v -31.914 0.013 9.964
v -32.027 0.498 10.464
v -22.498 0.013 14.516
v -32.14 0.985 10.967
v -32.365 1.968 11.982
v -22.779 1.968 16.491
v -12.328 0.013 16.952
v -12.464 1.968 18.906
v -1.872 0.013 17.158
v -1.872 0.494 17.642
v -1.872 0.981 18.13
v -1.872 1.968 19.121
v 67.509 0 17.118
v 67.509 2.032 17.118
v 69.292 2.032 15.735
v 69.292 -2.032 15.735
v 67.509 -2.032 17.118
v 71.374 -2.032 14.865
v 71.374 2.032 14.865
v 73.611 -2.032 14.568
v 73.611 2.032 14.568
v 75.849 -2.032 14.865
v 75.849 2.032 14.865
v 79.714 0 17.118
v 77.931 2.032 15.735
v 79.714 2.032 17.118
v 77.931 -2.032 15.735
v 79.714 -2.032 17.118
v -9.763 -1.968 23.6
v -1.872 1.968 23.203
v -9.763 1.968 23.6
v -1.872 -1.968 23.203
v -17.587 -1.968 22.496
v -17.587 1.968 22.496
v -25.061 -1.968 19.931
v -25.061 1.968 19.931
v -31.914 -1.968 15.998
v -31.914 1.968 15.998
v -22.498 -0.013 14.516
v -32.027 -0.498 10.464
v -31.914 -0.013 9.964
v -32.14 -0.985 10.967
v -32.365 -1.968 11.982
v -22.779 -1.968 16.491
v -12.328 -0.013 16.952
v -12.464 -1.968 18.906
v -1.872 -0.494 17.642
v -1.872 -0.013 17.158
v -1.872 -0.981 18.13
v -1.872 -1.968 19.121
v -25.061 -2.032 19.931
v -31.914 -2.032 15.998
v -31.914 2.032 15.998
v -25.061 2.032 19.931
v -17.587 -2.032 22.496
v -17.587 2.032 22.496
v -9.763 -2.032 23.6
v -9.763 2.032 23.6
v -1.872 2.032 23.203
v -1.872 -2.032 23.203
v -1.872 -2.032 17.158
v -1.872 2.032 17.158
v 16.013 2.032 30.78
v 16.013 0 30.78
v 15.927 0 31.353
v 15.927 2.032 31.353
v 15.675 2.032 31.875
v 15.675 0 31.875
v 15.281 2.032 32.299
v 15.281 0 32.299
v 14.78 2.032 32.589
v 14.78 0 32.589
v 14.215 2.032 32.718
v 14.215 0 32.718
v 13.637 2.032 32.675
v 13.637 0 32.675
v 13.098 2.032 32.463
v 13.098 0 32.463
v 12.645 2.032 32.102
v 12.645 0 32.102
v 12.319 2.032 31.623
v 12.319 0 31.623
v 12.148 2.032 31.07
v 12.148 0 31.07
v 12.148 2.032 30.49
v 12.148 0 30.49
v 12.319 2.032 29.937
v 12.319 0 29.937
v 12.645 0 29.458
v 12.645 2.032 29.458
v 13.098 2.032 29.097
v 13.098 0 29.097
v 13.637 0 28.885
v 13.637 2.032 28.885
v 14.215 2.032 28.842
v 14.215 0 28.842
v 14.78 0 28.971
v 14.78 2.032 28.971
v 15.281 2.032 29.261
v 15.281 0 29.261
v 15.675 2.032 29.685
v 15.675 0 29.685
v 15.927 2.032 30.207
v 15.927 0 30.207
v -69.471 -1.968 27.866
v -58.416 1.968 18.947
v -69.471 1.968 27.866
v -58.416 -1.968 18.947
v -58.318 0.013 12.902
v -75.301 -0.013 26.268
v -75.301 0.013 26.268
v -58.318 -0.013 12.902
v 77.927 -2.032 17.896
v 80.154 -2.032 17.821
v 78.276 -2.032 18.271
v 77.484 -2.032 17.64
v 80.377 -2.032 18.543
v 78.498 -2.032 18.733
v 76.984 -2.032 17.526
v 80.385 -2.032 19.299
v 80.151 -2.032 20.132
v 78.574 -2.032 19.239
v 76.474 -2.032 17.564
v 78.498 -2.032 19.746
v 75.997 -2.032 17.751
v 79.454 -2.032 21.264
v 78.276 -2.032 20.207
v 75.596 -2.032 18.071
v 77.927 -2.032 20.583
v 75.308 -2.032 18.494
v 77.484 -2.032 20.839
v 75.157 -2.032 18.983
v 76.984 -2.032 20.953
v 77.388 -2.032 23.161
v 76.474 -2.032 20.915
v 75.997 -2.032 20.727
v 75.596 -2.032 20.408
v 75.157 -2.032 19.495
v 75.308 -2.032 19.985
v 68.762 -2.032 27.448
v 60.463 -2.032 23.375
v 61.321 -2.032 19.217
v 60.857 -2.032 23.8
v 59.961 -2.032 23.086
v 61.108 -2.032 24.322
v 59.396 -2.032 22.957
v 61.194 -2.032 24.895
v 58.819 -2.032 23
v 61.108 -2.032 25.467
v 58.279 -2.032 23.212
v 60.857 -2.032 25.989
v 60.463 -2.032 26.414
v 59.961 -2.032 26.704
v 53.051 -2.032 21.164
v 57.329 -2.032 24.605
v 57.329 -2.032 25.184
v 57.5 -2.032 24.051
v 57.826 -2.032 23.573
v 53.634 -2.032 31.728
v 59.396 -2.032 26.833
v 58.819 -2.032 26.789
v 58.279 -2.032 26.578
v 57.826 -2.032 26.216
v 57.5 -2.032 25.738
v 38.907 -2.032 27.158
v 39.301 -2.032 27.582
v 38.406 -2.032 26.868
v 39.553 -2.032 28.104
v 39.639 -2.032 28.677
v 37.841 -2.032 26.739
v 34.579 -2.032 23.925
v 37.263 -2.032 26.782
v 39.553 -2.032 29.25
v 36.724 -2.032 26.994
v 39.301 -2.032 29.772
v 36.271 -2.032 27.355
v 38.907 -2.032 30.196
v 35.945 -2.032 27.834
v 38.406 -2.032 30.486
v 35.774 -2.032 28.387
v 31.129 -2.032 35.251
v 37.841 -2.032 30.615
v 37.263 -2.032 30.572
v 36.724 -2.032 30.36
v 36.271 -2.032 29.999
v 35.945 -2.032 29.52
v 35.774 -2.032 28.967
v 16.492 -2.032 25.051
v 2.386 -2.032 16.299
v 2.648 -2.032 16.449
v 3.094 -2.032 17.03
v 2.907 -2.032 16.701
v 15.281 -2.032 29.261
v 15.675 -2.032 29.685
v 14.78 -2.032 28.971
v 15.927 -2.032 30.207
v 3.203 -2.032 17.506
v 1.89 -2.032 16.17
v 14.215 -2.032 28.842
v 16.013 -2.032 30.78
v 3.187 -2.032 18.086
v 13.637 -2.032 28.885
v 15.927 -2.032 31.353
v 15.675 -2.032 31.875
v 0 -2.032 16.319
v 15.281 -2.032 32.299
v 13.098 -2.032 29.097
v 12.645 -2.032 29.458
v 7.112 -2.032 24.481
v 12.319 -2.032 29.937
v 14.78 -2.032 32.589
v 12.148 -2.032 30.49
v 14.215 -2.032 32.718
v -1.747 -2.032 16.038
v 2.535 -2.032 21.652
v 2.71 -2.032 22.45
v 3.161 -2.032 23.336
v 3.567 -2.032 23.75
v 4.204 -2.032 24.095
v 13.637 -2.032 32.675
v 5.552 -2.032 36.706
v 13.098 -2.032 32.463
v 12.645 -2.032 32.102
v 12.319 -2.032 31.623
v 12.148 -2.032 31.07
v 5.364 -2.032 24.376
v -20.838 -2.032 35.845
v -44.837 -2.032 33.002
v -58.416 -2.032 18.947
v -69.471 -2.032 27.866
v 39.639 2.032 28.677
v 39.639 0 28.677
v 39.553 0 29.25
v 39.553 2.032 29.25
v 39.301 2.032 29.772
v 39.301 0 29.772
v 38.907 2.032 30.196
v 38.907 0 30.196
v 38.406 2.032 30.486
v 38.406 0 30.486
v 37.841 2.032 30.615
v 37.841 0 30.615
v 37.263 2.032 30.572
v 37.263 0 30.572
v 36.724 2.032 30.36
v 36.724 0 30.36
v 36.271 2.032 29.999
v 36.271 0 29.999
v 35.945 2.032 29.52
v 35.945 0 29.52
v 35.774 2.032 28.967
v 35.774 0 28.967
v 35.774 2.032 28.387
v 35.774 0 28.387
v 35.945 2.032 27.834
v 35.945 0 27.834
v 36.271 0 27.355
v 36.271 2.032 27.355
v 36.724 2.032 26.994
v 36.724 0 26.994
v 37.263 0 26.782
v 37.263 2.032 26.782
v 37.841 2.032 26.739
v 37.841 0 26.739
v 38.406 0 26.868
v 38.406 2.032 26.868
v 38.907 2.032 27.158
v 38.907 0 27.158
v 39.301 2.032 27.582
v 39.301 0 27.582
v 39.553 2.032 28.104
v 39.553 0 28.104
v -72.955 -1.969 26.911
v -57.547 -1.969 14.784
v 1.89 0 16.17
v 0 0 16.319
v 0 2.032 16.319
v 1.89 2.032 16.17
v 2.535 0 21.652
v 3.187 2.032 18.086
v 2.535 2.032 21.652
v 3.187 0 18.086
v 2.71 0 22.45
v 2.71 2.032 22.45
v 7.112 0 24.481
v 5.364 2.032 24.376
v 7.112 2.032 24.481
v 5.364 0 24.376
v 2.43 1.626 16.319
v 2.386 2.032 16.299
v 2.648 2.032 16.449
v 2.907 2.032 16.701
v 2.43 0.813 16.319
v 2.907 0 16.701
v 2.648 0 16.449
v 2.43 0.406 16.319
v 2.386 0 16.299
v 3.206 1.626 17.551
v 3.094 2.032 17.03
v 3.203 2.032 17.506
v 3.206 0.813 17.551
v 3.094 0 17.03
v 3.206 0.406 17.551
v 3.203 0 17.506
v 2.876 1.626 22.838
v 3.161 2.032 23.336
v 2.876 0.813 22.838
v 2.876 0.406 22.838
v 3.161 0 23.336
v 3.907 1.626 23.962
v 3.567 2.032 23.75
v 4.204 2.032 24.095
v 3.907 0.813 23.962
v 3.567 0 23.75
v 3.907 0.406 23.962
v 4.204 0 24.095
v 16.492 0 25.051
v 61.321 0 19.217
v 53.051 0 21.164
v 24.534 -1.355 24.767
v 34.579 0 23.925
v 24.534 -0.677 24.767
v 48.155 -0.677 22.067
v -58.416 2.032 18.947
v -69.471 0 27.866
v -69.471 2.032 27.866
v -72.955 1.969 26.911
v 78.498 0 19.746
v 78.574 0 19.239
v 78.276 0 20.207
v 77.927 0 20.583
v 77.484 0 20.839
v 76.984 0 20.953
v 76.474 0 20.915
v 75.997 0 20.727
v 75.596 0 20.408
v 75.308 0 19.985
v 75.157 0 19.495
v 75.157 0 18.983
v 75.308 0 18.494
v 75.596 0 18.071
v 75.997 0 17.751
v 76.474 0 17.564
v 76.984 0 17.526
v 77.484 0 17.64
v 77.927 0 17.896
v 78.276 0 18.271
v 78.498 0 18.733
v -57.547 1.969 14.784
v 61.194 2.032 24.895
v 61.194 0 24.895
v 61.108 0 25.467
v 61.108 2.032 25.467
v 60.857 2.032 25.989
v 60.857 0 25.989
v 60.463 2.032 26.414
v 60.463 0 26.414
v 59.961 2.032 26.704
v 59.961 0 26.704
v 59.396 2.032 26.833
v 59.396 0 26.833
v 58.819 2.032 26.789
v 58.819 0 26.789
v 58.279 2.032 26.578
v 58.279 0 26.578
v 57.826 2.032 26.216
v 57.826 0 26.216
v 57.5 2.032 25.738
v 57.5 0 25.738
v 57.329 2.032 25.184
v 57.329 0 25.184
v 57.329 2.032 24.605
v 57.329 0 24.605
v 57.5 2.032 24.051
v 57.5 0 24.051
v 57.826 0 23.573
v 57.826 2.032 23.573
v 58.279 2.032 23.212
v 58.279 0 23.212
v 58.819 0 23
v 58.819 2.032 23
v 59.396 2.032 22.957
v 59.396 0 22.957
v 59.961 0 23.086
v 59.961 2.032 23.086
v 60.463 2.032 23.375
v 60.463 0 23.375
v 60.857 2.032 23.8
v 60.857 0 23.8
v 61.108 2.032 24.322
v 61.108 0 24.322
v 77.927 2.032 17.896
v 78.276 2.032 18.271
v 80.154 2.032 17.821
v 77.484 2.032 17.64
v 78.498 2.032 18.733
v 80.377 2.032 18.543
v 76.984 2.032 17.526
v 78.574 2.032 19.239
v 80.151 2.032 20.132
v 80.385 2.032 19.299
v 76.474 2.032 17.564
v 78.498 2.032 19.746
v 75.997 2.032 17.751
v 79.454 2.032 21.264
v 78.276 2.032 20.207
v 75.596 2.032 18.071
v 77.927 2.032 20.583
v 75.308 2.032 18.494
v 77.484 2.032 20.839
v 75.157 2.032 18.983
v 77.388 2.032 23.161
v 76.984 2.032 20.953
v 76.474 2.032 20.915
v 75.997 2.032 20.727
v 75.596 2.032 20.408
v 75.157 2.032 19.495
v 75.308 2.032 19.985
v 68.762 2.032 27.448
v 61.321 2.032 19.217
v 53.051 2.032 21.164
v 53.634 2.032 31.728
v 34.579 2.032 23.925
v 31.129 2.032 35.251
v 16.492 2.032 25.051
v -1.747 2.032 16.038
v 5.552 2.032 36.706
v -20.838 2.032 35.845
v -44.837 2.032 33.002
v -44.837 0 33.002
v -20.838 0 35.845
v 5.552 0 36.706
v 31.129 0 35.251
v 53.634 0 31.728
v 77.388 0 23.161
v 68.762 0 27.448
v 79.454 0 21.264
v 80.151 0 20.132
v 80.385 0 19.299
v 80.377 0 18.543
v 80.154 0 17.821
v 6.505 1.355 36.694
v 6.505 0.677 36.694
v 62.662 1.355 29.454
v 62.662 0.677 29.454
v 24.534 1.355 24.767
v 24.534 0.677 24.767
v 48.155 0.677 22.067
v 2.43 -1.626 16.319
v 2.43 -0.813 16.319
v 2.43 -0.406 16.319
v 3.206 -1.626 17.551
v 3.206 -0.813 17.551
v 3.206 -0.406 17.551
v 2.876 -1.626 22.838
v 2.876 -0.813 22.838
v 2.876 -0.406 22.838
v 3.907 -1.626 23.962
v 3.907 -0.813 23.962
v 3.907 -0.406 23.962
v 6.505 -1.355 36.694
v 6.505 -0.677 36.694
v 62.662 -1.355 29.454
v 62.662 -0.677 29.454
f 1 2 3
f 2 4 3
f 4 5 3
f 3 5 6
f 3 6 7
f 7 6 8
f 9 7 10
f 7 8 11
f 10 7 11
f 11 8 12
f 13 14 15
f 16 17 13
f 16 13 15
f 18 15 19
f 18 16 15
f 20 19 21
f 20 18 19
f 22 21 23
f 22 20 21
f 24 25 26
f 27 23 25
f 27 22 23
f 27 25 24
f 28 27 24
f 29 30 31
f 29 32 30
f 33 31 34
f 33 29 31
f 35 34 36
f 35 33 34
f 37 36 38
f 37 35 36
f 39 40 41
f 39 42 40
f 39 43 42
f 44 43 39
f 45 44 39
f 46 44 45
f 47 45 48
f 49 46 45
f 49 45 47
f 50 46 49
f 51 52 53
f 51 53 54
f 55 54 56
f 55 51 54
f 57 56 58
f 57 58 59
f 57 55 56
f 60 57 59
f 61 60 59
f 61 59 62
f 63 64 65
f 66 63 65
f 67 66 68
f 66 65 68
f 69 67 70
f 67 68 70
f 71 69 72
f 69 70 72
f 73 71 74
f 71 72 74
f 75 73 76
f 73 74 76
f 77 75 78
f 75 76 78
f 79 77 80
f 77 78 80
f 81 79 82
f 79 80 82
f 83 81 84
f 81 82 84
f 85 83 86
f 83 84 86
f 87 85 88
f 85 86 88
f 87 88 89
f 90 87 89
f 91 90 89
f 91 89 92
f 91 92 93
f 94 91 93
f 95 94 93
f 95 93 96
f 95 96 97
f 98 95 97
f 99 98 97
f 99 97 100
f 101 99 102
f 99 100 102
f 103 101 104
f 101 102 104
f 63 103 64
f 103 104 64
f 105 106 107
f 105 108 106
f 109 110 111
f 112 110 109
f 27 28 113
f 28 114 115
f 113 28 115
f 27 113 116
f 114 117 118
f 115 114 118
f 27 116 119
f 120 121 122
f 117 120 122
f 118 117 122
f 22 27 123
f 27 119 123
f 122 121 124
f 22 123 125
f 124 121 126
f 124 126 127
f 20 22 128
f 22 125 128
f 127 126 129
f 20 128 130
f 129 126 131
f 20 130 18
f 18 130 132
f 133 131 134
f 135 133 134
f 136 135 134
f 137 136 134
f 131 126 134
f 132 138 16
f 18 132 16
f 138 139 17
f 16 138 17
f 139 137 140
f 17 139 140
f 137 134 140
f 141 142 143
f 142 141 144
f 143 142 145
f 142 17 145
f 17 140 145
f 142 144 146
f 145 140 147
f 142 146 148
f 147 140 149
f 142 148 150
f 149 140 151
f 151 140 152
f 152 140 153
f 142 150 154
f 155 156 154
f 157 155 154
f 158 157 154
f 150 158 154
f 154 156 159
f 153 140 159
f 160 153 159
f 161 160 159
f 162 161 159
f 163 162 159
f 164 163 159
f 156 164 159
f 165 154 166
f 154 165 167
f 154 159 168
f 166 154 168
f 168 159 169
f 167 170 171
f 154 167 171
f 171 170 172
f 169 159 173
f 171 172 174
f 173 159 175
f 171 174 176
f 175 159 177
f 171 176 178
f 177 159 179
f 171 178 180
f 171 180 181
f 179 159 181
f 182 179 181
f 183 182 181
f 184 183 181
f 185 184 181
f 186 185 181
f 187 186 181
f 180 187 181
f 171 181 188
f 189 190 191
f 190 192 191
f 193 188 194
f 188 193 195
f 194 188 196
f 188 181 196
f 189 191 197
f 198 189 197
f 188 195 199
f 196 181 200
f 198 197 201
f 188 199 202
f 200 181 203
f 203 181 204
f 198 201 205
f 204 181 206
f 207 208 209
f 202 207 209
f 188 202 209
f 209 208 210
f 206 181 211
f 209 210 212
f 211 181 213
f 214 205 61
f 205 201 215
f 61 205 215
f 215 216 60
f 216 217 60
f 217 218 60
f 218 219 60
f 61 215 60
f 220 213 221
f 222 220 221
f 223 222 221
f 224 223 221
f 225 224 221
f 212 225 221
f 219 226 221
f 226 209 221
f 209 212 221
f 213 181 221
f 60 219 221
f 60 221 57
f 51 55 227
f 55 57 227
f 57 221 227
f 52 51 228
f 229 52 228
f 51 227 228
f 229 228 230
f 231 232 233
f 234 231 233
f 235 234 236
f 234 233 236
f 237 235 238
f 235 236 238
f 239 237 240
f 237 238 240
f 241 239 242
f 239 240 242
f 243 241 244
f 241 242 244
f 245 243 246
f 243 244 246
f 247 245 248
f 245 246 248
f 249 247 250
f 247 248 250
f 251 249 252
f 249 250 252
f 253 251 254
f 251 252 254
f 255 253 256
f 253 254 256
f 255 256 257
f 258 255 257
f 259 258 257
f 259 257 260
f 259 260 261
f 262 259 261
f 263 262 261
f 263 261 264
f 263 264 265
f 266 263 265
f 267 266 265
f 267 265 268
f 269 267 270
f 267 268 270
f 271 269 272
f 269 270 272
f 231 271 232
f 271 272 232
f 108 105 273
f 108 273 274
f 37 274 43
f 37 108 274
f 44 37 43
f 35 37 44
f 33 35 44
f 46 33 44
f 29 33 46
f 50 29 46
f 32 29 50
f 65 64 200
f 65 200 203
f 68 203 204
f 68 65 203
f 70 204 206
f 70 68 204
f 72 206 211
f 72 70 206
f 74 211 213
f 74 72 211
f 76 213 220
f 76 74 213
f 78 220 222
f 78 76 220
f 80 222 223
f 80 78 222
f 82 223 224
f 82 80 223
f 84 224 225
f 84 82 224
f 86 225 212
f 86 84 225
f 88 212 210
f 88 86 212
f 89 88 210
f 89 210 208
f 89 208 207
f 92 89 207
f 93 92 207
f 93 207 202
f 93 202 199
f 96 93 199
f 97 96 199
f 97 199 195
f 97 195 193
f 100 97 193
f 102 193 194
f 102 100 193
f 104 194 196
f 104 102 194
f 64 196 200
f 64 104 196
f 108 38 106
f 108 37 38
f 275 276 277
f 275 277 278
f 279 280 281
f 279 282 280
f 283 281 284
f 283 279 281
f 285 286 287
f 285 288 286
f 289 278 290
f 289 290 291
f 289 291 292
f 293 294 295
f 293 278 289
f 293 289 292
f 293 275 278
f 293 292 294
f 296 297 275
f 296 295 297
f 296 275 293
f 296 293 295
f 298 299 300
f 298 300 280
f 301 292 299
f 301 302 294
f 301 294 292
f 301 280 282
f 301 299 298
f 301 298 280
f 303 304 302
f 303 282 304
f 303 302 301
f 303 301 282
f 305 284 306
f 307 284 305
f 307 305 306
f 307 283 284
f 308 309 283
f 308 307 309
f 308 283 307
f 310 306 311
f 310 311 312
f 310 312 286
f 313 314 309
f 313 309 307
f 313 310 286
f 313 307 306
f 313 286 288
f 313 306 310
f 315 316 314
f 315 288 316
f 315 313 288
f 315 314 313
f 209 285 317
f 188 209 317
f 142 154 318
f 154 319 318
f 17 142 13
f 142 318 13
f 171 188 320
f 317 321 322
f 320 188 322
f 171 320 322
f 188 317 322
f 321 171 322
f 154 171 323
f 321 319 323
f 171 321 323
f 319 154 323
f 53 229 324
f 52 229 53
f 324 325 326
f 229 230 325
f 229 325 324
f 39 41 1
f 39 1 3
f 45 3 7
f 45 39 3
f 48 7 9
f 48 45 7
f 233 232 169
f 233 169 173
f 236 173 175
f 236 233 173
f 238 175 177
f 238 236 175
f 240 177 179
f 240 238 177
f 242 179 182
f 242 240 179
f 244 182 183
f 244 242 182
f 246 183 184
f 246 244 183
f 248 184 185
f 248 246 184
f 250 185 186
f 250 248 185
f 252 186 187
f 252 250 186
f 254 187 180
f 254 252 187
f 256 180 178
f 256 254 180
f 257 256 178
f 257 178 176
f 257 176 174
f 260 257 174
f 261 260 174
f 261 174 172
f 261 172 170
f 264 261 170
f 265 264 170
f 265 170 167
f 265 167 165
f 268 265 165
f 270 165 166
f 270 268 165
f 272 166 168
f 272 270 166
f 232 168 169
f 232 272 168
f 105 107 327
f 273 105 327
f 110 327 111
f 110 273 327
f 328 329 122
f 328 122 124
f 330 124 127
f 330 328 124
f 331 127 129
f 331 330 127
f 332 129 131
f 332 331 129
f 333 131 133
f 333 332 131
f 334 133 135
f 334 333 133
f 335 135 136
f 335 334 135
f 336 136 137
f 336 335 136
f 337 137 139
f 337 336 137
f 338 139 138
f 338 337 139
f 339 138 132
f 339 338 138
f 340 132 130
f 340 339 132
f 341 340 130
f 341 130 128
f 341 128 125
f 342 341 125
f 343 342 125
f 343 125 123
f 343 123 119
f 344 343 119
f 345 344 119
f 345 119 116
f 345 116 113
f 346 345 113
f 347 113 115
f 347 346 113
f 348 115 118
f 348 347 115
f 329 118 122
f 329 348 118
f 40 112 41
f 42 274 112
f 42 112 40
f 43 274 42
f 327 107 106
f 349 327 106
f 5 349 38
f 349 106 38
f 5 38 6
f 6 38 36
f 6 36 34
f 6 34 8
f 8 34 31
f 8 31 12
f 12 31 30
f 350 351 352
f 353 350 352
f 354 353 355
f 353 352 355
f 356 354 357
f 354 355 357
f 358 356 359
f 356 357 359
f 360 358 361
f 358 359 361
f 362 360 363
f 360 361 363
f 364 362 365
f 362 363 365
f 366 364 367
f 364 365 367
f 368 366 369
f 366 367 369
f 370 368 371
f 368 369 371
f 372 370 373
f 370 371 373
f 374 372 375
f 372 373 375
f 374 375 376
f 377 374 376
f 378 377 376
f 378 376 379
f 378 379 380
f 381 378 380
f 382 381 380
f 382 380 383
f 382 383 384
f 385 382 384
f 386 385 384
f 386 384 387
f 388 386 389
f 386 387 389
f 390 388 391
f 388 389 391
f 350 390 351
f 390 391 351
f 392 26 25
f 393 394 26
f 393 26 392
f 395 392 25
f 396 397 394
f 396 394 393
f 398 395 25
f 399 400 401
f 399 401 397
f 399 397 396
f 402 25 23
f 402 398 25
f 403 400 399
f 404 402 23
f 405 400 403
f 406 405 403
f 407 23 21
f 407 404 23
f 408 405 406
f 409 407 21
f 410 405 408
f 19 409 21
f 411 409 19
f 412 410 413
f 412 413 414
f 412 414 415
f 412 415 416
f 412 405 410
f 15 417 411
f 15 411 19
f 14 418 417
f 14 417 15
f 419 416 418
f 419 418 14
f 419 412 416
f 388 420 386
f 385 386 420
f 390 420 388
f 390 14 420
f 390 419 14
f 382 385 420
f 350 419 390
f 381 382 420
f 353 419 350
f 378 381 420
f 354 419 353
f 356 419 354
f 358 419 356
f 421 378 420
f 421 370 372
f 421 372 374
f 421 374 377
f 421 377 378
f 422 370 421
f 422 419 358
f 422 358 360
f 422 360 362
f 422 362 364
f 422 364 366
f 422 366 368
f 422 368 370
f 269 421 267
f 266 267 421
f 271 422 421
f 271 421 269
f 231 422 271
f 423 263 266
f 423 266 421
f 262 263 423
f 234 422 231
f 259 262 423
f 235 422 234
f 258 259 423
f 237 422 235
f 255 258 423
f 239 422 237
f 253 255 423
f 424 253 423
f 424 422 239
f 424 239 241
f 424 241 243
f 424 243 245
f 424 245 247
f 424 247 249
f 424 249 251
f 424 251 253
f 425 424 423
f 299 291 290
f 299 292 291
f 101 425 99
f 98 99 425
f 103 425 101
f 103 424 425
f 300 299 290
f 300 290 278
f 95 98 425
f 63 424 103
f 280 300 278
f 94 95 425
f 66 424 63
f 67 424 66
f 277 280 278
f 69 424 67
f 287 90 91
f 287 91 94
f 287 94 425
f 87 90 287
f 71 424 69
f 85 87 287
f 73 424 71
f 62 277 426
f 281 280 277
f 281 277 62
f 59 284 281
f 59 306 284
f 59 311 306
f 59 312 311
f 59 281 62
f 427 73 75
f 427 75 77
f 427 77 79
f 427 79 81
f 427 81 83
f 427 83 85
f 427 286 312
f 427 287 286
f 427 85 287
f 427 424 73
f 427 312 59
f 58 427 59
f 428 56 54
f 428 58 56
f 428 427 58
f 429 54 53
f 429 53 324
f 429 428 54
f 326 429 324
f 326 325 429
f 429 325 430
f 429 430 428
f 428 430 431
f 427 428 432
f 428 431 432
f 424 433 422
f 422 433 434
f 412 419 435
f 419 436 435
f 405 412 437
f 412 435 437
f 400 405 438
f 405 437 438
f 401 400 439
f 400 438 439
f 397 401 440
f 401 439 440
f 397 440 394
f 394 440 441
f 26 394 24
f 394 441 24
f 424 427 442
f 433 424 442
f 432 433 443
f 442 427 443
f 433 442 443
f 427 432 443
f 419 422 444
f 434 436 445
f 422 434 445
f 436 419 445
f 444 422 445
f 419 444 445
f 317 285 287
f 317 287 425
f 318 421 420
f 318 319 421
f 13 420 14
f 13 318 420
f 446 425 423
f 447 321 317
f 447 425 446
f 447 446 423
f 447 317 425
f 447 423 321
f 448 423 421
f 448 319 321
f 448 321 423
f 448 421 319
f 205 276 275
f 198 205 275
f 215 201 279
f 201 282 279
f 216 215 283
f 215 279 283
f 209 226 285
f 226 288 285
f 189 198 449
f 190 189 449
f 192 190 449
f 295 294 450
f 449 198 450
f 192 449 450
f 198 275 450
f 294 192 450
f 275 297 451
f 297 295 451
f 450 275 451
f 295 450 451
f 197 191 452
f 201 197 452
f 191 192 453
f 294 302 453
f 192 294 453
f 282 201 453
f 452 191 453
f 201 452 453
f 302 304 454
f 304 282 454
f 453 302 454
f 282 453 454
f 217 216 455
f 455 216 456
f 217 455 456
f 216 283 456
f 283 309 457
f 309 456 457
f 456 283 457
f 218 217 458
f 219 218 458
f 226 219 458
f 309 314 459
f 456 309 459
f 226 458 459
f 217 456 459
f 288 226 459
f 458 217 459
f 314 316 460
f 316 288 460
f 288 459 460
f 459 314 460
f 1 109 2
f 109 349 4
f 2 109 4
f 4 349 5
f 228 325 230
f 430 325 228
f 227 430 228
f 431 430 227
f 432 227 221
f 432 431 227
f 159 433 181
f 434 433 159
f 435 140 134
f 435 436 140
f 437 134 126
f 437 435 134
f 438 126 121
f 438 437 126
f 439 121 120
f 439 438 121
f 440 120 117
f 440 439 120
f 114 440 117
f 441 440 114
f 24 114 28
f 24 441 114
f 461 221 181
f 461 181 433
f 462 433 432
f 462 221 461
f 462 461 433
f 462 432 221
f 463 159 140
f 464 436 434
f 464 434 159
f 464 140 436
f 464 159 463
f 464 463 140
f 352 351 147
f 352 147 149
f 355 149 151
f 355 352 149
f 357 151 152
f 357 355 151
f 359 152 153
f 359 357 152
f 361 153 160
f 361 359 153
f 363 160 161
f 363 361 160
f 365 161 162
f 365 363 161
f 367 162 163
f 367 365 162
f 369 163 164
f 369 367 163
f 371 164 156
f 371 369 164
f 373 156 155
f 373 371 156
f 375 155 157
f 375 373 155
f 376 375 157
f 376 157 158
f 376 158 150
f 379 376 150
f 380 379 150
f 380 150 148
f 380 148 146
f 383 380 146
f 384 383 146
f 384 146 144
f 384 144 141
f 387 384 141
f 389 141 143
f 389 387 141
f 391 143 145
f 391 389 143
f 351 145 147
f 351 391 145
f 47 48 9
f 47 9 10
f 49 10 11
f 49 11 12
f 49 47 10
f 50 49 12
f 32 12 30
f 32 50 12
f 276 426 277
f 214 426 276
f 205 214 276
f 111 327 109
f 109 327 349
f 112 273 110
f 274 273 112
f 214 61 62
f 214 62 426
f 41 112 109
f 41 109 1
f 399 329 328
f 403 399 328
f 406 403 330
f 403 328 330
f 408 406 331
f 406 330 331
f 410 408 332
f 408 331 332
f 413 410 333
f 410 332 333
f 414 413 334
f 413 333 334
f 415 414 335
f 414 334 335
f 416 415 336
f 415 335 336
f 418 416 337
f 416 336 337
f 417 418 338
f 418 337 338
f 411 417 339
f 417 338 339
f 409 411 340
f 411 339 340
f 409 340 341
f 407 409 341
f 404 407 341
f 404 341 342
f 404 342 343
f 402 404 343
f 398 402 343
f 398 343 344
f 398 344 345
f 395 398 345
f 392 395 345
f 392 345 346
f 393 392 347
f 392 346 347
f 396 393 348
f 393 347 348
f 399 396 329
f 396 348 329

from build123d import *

# Parameters (mm, degrees)
F0_R     = 1.7183462858
F0_R_2   = 1.9433304257
F1_DEPTH = 2.032
F2_DEPTH = 1.9685
F3_SIZE  = 1.9558


with BuildPart() as f1:
    # F0 (on Front) → F1 (new body, symmetric)
    with BuildSketch(Plane.XZ):
        with BuildLine():
            add(Edge.make_bspline(
                [(-69.4708521305, 27.8661746463), (9.9840074996, 48.3840374301), (88.6448394765, 28.3458042164), (79.7140001511, 17.11815963)],
                knots=[0, 0, 0, 0, 149.5715212769, 149.5715212769, 149.5715212769, 149.5715212769], degree=3))
            Line((-69.4708521305, 27.8661746463), (-58.416051983, 18.9473896535))
            Line((-58.416051983, 18.9473896535), (-31.9135673344, 15.9977936665))
            ThreePointArc((-31.9135673344, 15.9977936665), (-17.587248866, 22.496253846), (-1.8718601204, 23.2033197119))
            Line((-1.8718601204, 23.2033197119), (-1.8718601204, 17.1581197119))
            Line((-1.8718601204, 17.1581197119), (-1.7470429884, 16.0378757864))
            Line((-1.7470429884, 16.0378757864), (0, 16.3187892042))
            add(Edge.make_bspline(
                [(0, 16.3187892042), (1.1555836561, 16.1358642079), (2.4484324817, 15.997535248), (3.6587214867, 17.5650119091), (2.2311991111, 21.138574202), (2.905895152, 23.1272157659), (3.8305041791, 24.4810397347), (7.1120347588, 24.4810397347)],
                knots=[0, 0, 0, 0, 0.1918644192, 0.3403730345, 0.5748171352, 0.7376421873, 1, 1, 1, 1], degree=3))
            add(Edge.make_bspline(
                [(7.1120347588, 24.4810397347), (17.9456137121, 26.5047568312), (53.7778158942, 22.9459838156), (67.5089657307, 17.11815963)],
                knots=[0, 0, 0, 0, 60.8440734522, 60.8440734522, 60.8440734522, 60.8440734522], degree=3))
            ThreePointArc((67.5089657307, 17.11815963), (73.6114829409, 14.5682282529), (79.7140001511, 17.11815963))
        make_face()
        with Locations((76.8559649587, 19.2392915487)):
            Circle(F0_R, mode=Mode.SUBTRACT)
        with Locations((37.6955829561, 28.6768935621)):
            Circle(F0_R_2, mode=Mode.SUBTRACT)
        with Locations((59.2509422454, 24.8946035713)):
            Circle(F0_R_2, mode=Mode.SUBTRACT)
        with Locations((14.0698300675, 30.7800769806)):
            Circle(F0_R_2, mode=Mode.SUBTRACT)
    extrude(amount=F1_DEPTH, both=True)


with BuildPart() as f2:
    # F0 (on Front) → F2 (new body, symmetric)
    with BuildSketch(Plane.XZ):
        Polygon((-58.416051983, 18.9473896535), (-69.4708521305, 27.8661746463), (-75.3010624319, 26.2683352044), (-58.3175272241, 12.9021896535), align=None)
        Polygon((-31.9135673344, 15.9977936665), (-58.416051983, 18.9473896535), (-58.3175272241, 12.9021896535), (-31.9135673344, 9.9635589868), align=None)
        with BuildLine():
            ThreePointArc((-1.8718601204, 23.2033197119), (-17.587248866, 22.496253846), (-31.9135673344, 15.9977936665))
            Line((-31.9135673344, 15.9977936665), (-31.9135673344, 9.9635589868))
            ThreePointArc((-31.9135673344, 9.9635589868), (-17.478765048, 16.0079633445), (-1.8718601204, 17.1581197119))
            Line((-1.8718601204, 17.1581197119), (-1.8718601204, 23.2033197119))
        make_face()
    extrude(amount=F2_DEPTH, both=True)

    # F3
    f3_edges = [f2.edges().sort_by_distance(p)[0] for p in [
        (-17.478765, -1.9685, 16.007963),
        (-17.478765, 1.9685, 16.007963),
        (-45.115547, -1.9685, 11.432874),
        (-45.115547, 1.9685, 11.432874),
        (-66.809295, -1.9685, 19.585262),
        (-66.809295, 1.9685, 19.585262),
    ]]
    chamfer(f3_edges, length=F3_SIZE)


solid = Compound([f1.part, f2.part])
